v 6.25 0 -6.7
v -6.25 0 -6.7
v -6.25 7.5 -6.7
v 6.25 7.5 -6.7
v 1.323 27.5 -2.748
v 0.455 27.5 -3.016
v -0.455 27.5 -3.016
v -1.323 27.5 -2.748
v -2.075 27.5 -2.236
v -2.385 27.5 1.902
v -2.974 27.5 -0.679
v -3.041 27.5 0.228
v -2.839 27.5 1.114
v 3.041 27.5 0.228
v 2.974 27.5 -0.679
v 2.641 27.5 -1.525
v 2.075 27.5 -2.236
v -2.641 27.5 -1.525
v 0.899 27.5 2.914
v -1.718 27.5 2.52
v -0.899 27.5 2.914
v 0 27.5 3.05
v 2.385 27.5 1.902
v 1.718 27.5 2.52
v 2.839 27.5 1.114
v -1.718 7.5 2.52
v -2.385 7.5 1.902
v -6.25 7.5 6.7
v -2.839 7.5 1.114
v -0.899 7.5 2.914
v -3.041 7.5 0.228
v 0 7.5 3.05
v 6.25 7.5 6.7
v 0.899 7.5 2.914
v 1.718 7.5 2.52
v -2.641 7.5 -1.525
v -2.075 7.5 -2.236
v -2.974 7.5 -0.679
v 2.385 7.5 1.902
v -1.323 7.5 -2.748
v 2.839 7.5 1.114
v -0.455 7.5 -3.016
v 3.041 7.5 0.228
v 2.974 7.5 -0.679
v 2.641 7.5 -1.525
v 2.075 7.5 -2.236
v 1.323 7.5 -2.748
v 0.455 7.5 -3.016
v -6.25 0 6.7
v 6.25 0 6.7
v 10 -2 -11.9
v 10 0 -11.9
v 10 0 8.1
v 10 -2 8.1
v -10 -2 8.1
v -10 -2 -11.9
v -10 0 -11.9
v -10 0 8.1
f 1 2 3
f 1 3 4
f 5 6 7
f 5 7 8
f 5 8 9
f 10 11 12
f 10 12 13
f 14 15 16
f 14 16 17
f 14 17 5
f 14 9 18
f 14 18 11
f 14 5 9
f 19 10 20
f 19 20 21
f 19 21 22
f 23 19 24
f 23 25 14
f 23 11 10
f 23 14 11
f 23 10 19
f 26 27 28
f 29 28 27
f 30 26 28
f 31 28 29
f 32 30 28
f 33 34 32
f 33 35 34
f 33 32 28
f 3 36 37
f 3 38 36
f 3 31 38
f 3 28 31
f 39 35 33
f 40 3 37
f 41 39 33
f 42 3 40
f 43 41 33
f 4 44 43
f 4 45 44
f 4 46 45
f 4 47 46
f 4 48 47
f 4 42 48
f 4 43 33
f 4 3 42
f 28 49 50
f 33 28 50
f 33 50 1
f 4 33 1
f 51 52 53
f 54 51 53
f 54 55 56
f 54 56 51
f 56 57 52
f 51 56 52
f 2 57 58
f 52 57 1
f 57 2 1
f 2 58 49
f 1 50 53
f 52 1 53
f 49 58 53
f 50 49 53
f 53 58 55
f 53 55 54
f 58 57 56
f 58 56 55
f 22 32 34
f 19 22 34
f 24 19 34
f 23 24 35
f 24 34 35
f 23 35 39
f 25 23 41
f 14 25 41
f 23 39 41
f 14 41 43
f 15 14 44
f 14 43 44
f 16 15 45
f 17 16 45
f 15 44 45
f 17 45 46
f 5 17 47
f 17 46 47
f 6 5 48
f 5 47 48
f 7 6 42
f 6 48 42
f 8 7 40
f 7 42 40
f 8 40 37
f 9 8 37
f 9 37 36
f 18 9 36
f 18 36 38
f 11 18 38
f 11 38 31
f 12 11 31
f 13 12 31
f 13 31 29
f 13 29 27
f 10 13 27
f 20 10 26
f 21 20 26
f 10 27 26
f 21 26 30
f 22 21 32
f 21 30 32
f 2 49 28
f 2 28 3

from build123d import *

# Parameters (mm, degrees)
SKETCH2_W           = 12.5
SKETCH2_H           = 13.4
BOSS_EXTRUDE1_DEPTH = 7.5
SKETCH3_R           = 3.05
BOSS_EXTRUDE2_DEPTH = 20
SKETCH4_W           = 20
SKETCH4_H           = 20
BOSS_EXTRUDE3_DEPTH = 2


with BuildPart() as part:
    # Sketch2 → Boss-Extrude1 (new body)
    with BuildSketch(Plane(origin=(0, 0, 0), x_dir=(1, 0, 0), z_dir=(0, 1, 0))):
        Rectangle(SKETCH2_W, SKETCH2_H)
    extrude(amount=BOSS_EXTRUDE1_DEPTH)

    # Sketch3 → Boss-Extrude2 (add)
    with BuildSketch(Plane(origin=(0, 7.5, 0), x_dir=(1, 0, 0), z_dir=(0, 1, 0))):
        with Locations(Location((0, 0, 0), (0, 0, 270))):
            Circle(SKETCH3_R)
    extrude(amount=BOSS_EXTRUDE2_DEPTH)

    # Sketch4 → Boss-Extrude3 (add)
    with BuildSketch(Plane.XZ):
        with Locations((0, -1.9)):
            Rectangle(SKETCH4_W, SKETCH4_H)
    extrude(amount=BOSS_EXTRUDE3_DEPTH)


solid = part.part
